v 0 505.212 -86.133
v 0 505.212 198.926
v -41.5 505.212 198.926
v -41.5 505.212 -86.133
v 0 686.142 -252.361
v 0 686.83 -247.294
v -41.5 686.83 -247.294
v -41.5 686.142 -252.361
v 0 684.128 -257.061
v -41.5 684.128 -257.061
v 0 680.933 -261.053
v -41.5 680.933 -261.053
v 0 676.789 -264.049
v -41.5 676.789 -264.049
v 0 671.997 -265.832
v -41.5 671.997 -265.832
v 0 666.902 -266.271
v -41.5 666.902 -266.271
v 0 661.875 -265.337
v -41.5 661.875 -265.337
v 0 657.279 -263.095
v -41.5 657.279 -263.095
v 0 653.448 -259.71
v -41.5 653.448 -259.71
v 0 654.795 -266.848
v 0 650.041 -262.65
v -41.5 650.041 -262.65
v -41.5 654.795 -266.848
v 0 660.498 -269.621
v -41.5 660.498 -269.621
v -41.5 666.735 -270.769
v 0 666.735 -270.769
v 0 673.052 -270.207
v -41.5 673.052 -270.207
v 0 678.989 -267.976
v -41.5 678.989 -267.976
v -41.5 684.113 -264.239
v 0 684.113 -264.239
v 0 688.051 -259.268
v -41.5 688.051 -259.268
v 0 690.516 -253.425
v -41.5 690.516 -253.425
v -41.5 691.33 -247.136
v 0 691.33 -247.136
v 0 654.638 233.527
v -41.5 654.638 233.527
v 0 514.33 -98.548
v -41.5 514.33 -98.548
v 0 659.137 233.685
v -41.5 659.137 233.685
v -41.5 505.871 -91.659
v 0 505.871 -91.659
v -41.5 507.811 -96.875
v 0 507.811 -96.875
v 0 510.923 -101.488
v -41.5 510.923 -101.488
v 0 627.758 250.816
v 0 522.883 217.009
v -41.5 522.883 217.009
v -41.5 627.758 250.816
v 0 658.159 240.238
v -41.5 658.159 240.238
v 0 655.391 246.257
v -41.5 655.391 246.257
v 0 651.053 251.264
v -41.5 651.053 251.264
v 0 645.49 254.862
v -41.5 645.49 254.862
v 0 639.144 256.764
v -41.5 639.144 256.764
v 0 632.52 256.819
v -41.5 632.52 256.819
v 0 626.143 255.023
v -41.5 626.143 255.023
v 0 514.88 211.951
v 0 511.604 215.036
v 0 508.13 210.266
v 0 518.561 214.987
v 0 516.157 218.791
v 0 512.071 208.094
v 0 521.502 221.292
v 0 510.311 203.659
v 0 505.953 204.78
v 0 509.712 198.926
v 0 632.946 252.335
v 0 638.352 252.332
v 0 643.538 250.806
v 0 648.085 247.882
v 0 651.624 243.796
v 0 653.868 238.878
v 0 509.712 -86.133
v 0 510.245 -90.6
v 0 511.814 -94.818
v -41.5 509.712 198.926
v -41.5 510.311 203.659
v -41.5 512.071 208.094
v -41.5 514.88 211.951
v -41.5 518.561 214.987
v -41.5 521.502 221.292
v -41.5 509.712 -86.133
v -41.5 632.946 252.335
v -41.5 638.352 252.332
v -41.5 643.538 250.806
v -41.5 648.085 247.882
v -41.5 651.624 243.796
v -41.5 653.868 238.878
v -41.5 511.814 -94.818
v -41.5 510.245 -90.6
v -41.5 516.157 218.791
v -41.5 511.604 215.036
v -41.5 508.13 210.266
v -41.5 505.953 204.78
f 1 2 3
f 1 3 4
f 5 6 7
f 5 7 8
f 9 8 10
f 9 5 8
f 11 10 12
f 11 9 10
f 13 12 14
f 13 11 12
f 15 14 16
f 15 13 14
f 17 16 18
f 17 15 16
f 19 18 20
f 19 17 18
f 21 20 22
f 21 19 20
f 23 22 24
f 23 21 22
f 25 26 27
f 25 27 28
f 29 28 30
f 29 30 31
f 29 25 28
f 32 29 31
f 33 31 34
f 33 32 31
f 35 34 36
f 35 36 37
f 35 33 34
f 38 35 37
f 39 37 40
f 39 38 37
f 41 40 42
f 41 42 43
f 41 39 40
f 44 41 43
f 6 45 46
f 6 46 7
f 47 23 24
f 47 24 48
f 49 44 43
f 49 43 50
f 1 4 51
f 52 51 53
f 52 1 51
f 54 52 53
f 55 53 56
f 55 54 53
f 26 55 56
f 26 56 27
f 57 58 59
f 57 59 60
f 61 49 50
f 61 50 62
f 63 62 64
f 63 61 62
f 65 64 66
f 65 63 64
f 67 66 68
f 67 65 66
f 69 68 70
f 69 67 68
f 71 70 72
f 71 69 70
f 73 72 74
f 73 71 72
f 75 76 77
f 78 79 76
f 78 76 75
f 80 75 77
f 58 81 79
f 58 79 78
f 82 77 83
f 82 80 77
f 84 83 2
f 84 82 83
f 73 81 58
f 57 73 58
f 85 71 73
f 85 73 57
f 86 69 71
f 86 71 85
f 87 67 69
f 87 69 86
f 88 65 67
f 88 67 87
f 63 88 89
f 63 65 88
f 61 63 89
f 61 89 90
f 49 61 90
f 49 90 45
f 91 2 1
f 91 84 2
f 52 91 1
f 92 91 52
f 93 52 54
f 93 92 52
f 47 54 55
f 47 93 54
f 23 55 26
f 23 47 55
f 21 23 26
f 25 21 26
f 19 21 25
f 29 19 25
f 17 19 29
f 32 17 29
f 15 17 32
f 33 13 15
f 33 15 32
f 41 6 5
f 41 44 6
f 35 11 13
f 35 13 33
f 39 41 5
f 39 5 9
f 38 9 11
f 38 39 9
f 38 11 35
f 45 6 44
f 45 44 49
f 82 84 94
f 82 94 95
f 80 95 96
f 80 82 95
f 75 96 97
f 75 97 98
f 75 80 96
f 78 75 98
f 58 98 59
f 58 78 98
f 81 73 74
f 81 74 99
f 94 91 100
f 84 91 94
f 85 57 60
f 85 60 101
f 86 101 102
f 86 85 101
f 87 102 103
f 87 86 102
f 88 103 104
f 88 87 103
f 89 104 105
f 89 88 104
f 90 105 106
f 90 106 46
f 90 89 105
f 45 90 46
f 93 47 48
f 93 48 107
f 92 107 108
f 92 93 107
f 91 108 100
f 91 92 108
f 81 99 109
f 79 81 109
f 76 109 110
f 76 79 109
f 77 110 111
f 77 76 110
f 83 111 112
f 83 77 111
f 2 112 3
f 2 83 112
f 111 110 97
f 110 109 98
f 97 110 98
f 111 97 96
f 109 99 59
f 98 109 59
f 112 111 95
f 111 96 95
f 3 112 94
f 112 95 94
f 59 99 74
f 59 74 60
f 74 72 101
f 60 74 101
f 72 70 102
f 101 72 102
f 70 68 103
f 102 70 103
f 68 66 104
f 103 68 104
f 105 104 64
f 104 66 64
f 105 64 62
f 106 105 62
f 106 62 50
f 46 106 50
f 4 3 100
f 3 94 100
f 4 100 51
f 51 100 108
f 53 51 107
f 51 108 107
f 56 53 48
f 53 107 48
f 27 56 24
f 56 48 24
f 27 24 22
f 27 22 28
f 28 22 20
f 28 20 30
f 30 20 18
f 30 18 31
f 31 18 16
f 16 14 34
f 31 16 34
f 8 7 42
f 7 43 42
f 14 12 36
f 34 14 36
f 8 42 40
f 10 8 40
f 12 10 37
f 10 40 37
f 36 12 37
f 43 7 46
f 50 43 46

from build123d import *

# Parameters (mm, degrees)
EXTRUDE_1_DEPTH = 41.5


with BuildPart() as part:
    # 草图1 → 凸台-拉伸1 (new body)
    with BuildSketch(Plane.ZY):
        with BuildLine():
            Line((-247.135706549, 691.329742198), (233.685421601, 659.136990159))
            ThreePointArc((233.685421601, 659.136990159), (253.25995653, 648.399148569), (255.023393056, 626.142600064))
            Line((255.023393056, 626.142600064), (221.292164335, 521.502399447))
            ThreePointArc((221.292164335, 521.502399447), (212.760551455, 509.716531999), (198.925533748, 505.212381151))
            Line((198.925533748, 505.212381151), (-86.132619056, 505.212381151))
            ThreePointArc((-86.132619056, 505.212381151), (-94.324335579, 506.686356081), (-101.488444886, 510.923378563))
            Line((-101.488444886, 510.923378563), (-262.649988816, 650.041273838))
            ThreePointArc((-262.649988816, 650.041273838), (-269.292445055, 676.096205655), (-247.135706549, 691.329742198))
        make_face()
        with BuildLine():
            Line((-259.709511529, 653.447678589), (-98.547967599, 514.329783314))
            ThreePointArc((-98.547967599, 514.329783314), (-92.75570901, 510.904105562), (-86.132619056, 509.712381151))
            Line((-86.132619056, 509.712381151), (198.925533748, 509.712381151))
            ThreePointArc((198.925533748, 509.712381151), (210.111292745, 513.354035028), (217.00919252, 522.883034241))
            Line((217.00919252, 522.883034241), (250.816171993, 627.758227005))
            ThreePointArc((250.816171993, 627.758227005), (249.506743796, 645.91598122), (233.526965164, 654.637524387))
            Line((233.526965164, 654.637524387), (-247.294162986, 686.830276426))
            ThreePointArc((-247.294162986, 686.830276426), (-265.102438575, 674.453366381), (-259.709511529, 653.447678589))
        make_face(mode=Mode.SUBTRACT)
    extrude(amount=EXTRUDE_1_DEPTH)


solid = part.part
